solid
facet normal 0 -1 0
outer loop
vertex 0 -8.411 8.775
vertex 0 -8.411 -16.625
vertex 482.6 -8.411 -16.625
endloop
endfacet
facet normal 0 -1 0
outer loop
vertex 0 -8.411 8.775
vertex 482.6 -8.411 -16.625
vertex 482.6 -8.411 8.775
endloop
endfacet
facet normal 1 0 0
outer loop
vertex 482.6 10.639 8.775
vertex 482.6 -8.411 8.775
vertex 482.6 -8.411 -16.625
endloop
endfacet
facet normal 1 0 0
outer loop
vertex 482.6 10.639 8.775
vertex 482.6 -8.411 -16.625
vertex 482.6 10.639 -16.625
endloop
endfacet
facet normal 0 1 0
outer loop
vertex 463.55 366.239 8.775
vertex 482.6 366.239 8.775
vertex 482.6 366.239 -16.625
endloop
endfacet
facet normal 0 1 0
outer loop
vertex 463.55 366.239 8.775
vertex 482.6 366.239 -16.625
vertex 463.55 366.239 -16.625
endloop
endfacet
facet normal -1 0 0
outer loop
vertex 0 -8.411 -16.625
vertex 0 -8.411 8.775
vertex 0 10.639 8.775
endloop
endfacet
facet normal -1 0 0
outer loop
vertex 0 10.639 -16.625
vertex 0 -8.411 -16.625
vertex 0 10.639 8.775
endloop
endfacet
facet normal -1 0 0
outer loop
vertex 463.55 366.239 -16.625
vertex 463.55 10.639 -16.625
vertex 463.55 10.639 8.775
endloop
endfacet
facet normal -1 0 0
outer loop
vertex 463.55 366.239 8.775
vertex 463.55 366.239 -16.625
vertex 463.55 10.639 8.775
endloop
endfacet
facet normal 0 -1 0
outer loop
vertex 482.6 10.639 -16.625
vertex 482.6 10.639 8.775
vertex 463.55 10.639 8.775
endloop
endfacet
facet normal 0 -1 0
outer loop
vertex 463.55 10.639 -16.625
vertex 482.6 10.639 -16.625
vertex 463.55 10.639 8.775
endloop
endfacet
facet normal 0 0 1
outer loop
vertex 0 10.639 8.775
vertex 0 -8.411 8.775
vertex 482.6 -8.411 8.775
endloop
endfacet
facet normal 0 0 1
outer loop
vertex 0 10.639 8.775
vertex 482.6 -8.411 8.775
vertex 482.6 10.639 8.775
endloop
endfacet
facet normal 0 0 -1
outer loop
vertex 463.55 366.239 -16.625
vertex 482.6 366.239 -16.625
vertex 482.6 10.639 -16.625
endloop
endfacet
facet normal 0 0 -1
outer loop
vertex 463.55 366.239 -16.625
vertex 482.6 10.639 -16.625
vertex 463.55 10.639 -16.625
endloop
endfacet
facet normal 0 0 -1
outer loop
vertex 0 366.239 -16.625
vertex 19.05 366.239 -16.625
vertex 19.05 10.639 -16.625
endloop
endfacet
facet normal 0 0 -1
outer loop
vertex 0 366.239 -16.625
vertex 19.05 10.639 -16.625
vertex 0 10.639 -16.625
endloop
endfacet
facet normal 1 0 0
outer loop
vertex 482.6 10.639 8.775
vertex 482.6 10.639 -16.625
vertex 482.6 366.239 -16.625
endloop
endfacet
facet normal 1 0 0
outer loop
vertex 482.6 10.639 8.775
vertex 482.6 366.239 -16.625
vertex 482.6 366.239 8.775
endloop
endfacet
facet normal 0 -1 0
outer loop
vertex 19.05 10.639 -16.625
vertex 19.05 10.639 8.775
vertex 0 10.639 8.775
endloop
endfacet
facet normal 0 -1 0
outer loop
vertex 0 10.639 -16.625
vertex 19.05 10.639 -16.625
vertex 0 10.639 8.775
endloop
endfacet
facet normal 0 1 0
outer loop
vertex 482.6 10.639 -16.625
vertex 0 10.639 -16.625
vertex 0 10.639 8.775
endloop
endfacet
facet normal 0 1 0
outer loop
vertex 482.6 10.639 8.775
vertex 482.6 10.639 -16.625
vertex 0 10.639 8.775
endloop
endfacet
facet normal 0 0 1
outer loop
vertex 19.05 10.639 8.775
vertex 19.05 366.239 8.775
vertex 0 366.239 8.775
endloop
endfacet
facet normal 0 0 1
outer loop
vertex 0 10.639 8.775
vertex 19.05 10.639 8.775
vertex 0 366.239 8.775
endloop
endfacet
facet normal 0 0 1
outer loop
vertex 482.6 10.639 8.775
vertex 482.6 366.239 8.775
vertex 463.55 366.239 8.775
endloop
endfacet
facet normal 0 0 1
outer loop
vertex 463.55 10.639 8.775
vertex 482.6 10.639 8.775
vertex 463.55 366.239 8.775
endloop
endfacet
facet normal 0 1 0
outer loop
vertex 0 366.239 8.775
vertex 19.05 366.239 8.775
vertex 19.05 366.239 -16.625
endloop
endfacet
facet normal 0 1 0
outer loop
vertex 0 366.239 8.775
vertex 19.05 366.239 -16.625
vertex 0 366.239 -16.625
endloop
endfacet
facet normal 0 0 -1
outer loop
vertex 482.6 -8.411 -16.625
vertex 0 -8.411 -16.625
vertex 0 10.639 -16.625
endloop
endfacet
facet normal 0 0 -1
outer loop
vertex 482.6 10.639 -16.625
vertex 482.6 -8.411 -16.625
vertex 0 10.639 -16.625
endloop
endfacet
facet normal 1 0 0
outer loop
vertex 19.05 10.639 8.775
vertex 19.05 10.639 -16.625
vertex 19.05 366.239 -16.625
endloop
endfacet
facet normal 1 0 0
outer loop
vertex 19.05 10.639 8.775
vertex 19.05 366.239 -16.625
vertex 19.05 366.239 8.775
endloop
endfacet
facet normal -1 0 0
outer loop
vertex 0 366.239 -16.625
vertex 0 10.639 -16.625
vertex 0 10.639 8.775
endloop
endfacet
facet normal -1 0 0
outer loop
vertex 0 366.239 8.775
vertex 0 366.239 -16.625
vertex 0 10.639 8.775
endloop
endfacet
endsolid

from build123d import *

# Parameters (mm, degrees)
F0_W     = 19.05
F0_H     = 25.4
F1_DEPTH = 482.6
F2_W     = 19.05
F2_H     = 25.4
F3_DEPTH = 355.6
F4_W     = 19.05
F4_H     = 25.4
F5_DEPTH = 355.6


with BuildPart() as f1:
    # F0 (on Right) → F1 (new body)
    with BuildSketch(Plane.YZ):
        with Locations((1.114054, -3.925239)):
            Rectangle(F0_W, F0_H)
    extrude(amount=F1_DEPTH)


with BuildPart() as f3:
    # F2 (on face) → F3 (new body)
    with BuildSketch(Plane(origin=(0, 10.639054, 0), x_dir=(-1, 0, 0), z_dir=(0, 1, 0))):
        with Locations((-9.525, -3.925239)):
            Rectangle(F2_W, F2_H)
    extrude(amount=F3_DEPTH)


with BuildPart() as f5:
    # F4 (on face) → F5 (new body)
    with BuildSketch(Plane(origin=(0, 10.639054, 0), x_dir=(-1, 0, 0), z_dir=(0, 1, 0))):
        with Locations((-473.075, -3.925239)):
            Rectangle(F4_W, F4_H)
    extrude(amount=F5_DEPTH)


solid = Compound([f1.part, f3.part, f5.part])
